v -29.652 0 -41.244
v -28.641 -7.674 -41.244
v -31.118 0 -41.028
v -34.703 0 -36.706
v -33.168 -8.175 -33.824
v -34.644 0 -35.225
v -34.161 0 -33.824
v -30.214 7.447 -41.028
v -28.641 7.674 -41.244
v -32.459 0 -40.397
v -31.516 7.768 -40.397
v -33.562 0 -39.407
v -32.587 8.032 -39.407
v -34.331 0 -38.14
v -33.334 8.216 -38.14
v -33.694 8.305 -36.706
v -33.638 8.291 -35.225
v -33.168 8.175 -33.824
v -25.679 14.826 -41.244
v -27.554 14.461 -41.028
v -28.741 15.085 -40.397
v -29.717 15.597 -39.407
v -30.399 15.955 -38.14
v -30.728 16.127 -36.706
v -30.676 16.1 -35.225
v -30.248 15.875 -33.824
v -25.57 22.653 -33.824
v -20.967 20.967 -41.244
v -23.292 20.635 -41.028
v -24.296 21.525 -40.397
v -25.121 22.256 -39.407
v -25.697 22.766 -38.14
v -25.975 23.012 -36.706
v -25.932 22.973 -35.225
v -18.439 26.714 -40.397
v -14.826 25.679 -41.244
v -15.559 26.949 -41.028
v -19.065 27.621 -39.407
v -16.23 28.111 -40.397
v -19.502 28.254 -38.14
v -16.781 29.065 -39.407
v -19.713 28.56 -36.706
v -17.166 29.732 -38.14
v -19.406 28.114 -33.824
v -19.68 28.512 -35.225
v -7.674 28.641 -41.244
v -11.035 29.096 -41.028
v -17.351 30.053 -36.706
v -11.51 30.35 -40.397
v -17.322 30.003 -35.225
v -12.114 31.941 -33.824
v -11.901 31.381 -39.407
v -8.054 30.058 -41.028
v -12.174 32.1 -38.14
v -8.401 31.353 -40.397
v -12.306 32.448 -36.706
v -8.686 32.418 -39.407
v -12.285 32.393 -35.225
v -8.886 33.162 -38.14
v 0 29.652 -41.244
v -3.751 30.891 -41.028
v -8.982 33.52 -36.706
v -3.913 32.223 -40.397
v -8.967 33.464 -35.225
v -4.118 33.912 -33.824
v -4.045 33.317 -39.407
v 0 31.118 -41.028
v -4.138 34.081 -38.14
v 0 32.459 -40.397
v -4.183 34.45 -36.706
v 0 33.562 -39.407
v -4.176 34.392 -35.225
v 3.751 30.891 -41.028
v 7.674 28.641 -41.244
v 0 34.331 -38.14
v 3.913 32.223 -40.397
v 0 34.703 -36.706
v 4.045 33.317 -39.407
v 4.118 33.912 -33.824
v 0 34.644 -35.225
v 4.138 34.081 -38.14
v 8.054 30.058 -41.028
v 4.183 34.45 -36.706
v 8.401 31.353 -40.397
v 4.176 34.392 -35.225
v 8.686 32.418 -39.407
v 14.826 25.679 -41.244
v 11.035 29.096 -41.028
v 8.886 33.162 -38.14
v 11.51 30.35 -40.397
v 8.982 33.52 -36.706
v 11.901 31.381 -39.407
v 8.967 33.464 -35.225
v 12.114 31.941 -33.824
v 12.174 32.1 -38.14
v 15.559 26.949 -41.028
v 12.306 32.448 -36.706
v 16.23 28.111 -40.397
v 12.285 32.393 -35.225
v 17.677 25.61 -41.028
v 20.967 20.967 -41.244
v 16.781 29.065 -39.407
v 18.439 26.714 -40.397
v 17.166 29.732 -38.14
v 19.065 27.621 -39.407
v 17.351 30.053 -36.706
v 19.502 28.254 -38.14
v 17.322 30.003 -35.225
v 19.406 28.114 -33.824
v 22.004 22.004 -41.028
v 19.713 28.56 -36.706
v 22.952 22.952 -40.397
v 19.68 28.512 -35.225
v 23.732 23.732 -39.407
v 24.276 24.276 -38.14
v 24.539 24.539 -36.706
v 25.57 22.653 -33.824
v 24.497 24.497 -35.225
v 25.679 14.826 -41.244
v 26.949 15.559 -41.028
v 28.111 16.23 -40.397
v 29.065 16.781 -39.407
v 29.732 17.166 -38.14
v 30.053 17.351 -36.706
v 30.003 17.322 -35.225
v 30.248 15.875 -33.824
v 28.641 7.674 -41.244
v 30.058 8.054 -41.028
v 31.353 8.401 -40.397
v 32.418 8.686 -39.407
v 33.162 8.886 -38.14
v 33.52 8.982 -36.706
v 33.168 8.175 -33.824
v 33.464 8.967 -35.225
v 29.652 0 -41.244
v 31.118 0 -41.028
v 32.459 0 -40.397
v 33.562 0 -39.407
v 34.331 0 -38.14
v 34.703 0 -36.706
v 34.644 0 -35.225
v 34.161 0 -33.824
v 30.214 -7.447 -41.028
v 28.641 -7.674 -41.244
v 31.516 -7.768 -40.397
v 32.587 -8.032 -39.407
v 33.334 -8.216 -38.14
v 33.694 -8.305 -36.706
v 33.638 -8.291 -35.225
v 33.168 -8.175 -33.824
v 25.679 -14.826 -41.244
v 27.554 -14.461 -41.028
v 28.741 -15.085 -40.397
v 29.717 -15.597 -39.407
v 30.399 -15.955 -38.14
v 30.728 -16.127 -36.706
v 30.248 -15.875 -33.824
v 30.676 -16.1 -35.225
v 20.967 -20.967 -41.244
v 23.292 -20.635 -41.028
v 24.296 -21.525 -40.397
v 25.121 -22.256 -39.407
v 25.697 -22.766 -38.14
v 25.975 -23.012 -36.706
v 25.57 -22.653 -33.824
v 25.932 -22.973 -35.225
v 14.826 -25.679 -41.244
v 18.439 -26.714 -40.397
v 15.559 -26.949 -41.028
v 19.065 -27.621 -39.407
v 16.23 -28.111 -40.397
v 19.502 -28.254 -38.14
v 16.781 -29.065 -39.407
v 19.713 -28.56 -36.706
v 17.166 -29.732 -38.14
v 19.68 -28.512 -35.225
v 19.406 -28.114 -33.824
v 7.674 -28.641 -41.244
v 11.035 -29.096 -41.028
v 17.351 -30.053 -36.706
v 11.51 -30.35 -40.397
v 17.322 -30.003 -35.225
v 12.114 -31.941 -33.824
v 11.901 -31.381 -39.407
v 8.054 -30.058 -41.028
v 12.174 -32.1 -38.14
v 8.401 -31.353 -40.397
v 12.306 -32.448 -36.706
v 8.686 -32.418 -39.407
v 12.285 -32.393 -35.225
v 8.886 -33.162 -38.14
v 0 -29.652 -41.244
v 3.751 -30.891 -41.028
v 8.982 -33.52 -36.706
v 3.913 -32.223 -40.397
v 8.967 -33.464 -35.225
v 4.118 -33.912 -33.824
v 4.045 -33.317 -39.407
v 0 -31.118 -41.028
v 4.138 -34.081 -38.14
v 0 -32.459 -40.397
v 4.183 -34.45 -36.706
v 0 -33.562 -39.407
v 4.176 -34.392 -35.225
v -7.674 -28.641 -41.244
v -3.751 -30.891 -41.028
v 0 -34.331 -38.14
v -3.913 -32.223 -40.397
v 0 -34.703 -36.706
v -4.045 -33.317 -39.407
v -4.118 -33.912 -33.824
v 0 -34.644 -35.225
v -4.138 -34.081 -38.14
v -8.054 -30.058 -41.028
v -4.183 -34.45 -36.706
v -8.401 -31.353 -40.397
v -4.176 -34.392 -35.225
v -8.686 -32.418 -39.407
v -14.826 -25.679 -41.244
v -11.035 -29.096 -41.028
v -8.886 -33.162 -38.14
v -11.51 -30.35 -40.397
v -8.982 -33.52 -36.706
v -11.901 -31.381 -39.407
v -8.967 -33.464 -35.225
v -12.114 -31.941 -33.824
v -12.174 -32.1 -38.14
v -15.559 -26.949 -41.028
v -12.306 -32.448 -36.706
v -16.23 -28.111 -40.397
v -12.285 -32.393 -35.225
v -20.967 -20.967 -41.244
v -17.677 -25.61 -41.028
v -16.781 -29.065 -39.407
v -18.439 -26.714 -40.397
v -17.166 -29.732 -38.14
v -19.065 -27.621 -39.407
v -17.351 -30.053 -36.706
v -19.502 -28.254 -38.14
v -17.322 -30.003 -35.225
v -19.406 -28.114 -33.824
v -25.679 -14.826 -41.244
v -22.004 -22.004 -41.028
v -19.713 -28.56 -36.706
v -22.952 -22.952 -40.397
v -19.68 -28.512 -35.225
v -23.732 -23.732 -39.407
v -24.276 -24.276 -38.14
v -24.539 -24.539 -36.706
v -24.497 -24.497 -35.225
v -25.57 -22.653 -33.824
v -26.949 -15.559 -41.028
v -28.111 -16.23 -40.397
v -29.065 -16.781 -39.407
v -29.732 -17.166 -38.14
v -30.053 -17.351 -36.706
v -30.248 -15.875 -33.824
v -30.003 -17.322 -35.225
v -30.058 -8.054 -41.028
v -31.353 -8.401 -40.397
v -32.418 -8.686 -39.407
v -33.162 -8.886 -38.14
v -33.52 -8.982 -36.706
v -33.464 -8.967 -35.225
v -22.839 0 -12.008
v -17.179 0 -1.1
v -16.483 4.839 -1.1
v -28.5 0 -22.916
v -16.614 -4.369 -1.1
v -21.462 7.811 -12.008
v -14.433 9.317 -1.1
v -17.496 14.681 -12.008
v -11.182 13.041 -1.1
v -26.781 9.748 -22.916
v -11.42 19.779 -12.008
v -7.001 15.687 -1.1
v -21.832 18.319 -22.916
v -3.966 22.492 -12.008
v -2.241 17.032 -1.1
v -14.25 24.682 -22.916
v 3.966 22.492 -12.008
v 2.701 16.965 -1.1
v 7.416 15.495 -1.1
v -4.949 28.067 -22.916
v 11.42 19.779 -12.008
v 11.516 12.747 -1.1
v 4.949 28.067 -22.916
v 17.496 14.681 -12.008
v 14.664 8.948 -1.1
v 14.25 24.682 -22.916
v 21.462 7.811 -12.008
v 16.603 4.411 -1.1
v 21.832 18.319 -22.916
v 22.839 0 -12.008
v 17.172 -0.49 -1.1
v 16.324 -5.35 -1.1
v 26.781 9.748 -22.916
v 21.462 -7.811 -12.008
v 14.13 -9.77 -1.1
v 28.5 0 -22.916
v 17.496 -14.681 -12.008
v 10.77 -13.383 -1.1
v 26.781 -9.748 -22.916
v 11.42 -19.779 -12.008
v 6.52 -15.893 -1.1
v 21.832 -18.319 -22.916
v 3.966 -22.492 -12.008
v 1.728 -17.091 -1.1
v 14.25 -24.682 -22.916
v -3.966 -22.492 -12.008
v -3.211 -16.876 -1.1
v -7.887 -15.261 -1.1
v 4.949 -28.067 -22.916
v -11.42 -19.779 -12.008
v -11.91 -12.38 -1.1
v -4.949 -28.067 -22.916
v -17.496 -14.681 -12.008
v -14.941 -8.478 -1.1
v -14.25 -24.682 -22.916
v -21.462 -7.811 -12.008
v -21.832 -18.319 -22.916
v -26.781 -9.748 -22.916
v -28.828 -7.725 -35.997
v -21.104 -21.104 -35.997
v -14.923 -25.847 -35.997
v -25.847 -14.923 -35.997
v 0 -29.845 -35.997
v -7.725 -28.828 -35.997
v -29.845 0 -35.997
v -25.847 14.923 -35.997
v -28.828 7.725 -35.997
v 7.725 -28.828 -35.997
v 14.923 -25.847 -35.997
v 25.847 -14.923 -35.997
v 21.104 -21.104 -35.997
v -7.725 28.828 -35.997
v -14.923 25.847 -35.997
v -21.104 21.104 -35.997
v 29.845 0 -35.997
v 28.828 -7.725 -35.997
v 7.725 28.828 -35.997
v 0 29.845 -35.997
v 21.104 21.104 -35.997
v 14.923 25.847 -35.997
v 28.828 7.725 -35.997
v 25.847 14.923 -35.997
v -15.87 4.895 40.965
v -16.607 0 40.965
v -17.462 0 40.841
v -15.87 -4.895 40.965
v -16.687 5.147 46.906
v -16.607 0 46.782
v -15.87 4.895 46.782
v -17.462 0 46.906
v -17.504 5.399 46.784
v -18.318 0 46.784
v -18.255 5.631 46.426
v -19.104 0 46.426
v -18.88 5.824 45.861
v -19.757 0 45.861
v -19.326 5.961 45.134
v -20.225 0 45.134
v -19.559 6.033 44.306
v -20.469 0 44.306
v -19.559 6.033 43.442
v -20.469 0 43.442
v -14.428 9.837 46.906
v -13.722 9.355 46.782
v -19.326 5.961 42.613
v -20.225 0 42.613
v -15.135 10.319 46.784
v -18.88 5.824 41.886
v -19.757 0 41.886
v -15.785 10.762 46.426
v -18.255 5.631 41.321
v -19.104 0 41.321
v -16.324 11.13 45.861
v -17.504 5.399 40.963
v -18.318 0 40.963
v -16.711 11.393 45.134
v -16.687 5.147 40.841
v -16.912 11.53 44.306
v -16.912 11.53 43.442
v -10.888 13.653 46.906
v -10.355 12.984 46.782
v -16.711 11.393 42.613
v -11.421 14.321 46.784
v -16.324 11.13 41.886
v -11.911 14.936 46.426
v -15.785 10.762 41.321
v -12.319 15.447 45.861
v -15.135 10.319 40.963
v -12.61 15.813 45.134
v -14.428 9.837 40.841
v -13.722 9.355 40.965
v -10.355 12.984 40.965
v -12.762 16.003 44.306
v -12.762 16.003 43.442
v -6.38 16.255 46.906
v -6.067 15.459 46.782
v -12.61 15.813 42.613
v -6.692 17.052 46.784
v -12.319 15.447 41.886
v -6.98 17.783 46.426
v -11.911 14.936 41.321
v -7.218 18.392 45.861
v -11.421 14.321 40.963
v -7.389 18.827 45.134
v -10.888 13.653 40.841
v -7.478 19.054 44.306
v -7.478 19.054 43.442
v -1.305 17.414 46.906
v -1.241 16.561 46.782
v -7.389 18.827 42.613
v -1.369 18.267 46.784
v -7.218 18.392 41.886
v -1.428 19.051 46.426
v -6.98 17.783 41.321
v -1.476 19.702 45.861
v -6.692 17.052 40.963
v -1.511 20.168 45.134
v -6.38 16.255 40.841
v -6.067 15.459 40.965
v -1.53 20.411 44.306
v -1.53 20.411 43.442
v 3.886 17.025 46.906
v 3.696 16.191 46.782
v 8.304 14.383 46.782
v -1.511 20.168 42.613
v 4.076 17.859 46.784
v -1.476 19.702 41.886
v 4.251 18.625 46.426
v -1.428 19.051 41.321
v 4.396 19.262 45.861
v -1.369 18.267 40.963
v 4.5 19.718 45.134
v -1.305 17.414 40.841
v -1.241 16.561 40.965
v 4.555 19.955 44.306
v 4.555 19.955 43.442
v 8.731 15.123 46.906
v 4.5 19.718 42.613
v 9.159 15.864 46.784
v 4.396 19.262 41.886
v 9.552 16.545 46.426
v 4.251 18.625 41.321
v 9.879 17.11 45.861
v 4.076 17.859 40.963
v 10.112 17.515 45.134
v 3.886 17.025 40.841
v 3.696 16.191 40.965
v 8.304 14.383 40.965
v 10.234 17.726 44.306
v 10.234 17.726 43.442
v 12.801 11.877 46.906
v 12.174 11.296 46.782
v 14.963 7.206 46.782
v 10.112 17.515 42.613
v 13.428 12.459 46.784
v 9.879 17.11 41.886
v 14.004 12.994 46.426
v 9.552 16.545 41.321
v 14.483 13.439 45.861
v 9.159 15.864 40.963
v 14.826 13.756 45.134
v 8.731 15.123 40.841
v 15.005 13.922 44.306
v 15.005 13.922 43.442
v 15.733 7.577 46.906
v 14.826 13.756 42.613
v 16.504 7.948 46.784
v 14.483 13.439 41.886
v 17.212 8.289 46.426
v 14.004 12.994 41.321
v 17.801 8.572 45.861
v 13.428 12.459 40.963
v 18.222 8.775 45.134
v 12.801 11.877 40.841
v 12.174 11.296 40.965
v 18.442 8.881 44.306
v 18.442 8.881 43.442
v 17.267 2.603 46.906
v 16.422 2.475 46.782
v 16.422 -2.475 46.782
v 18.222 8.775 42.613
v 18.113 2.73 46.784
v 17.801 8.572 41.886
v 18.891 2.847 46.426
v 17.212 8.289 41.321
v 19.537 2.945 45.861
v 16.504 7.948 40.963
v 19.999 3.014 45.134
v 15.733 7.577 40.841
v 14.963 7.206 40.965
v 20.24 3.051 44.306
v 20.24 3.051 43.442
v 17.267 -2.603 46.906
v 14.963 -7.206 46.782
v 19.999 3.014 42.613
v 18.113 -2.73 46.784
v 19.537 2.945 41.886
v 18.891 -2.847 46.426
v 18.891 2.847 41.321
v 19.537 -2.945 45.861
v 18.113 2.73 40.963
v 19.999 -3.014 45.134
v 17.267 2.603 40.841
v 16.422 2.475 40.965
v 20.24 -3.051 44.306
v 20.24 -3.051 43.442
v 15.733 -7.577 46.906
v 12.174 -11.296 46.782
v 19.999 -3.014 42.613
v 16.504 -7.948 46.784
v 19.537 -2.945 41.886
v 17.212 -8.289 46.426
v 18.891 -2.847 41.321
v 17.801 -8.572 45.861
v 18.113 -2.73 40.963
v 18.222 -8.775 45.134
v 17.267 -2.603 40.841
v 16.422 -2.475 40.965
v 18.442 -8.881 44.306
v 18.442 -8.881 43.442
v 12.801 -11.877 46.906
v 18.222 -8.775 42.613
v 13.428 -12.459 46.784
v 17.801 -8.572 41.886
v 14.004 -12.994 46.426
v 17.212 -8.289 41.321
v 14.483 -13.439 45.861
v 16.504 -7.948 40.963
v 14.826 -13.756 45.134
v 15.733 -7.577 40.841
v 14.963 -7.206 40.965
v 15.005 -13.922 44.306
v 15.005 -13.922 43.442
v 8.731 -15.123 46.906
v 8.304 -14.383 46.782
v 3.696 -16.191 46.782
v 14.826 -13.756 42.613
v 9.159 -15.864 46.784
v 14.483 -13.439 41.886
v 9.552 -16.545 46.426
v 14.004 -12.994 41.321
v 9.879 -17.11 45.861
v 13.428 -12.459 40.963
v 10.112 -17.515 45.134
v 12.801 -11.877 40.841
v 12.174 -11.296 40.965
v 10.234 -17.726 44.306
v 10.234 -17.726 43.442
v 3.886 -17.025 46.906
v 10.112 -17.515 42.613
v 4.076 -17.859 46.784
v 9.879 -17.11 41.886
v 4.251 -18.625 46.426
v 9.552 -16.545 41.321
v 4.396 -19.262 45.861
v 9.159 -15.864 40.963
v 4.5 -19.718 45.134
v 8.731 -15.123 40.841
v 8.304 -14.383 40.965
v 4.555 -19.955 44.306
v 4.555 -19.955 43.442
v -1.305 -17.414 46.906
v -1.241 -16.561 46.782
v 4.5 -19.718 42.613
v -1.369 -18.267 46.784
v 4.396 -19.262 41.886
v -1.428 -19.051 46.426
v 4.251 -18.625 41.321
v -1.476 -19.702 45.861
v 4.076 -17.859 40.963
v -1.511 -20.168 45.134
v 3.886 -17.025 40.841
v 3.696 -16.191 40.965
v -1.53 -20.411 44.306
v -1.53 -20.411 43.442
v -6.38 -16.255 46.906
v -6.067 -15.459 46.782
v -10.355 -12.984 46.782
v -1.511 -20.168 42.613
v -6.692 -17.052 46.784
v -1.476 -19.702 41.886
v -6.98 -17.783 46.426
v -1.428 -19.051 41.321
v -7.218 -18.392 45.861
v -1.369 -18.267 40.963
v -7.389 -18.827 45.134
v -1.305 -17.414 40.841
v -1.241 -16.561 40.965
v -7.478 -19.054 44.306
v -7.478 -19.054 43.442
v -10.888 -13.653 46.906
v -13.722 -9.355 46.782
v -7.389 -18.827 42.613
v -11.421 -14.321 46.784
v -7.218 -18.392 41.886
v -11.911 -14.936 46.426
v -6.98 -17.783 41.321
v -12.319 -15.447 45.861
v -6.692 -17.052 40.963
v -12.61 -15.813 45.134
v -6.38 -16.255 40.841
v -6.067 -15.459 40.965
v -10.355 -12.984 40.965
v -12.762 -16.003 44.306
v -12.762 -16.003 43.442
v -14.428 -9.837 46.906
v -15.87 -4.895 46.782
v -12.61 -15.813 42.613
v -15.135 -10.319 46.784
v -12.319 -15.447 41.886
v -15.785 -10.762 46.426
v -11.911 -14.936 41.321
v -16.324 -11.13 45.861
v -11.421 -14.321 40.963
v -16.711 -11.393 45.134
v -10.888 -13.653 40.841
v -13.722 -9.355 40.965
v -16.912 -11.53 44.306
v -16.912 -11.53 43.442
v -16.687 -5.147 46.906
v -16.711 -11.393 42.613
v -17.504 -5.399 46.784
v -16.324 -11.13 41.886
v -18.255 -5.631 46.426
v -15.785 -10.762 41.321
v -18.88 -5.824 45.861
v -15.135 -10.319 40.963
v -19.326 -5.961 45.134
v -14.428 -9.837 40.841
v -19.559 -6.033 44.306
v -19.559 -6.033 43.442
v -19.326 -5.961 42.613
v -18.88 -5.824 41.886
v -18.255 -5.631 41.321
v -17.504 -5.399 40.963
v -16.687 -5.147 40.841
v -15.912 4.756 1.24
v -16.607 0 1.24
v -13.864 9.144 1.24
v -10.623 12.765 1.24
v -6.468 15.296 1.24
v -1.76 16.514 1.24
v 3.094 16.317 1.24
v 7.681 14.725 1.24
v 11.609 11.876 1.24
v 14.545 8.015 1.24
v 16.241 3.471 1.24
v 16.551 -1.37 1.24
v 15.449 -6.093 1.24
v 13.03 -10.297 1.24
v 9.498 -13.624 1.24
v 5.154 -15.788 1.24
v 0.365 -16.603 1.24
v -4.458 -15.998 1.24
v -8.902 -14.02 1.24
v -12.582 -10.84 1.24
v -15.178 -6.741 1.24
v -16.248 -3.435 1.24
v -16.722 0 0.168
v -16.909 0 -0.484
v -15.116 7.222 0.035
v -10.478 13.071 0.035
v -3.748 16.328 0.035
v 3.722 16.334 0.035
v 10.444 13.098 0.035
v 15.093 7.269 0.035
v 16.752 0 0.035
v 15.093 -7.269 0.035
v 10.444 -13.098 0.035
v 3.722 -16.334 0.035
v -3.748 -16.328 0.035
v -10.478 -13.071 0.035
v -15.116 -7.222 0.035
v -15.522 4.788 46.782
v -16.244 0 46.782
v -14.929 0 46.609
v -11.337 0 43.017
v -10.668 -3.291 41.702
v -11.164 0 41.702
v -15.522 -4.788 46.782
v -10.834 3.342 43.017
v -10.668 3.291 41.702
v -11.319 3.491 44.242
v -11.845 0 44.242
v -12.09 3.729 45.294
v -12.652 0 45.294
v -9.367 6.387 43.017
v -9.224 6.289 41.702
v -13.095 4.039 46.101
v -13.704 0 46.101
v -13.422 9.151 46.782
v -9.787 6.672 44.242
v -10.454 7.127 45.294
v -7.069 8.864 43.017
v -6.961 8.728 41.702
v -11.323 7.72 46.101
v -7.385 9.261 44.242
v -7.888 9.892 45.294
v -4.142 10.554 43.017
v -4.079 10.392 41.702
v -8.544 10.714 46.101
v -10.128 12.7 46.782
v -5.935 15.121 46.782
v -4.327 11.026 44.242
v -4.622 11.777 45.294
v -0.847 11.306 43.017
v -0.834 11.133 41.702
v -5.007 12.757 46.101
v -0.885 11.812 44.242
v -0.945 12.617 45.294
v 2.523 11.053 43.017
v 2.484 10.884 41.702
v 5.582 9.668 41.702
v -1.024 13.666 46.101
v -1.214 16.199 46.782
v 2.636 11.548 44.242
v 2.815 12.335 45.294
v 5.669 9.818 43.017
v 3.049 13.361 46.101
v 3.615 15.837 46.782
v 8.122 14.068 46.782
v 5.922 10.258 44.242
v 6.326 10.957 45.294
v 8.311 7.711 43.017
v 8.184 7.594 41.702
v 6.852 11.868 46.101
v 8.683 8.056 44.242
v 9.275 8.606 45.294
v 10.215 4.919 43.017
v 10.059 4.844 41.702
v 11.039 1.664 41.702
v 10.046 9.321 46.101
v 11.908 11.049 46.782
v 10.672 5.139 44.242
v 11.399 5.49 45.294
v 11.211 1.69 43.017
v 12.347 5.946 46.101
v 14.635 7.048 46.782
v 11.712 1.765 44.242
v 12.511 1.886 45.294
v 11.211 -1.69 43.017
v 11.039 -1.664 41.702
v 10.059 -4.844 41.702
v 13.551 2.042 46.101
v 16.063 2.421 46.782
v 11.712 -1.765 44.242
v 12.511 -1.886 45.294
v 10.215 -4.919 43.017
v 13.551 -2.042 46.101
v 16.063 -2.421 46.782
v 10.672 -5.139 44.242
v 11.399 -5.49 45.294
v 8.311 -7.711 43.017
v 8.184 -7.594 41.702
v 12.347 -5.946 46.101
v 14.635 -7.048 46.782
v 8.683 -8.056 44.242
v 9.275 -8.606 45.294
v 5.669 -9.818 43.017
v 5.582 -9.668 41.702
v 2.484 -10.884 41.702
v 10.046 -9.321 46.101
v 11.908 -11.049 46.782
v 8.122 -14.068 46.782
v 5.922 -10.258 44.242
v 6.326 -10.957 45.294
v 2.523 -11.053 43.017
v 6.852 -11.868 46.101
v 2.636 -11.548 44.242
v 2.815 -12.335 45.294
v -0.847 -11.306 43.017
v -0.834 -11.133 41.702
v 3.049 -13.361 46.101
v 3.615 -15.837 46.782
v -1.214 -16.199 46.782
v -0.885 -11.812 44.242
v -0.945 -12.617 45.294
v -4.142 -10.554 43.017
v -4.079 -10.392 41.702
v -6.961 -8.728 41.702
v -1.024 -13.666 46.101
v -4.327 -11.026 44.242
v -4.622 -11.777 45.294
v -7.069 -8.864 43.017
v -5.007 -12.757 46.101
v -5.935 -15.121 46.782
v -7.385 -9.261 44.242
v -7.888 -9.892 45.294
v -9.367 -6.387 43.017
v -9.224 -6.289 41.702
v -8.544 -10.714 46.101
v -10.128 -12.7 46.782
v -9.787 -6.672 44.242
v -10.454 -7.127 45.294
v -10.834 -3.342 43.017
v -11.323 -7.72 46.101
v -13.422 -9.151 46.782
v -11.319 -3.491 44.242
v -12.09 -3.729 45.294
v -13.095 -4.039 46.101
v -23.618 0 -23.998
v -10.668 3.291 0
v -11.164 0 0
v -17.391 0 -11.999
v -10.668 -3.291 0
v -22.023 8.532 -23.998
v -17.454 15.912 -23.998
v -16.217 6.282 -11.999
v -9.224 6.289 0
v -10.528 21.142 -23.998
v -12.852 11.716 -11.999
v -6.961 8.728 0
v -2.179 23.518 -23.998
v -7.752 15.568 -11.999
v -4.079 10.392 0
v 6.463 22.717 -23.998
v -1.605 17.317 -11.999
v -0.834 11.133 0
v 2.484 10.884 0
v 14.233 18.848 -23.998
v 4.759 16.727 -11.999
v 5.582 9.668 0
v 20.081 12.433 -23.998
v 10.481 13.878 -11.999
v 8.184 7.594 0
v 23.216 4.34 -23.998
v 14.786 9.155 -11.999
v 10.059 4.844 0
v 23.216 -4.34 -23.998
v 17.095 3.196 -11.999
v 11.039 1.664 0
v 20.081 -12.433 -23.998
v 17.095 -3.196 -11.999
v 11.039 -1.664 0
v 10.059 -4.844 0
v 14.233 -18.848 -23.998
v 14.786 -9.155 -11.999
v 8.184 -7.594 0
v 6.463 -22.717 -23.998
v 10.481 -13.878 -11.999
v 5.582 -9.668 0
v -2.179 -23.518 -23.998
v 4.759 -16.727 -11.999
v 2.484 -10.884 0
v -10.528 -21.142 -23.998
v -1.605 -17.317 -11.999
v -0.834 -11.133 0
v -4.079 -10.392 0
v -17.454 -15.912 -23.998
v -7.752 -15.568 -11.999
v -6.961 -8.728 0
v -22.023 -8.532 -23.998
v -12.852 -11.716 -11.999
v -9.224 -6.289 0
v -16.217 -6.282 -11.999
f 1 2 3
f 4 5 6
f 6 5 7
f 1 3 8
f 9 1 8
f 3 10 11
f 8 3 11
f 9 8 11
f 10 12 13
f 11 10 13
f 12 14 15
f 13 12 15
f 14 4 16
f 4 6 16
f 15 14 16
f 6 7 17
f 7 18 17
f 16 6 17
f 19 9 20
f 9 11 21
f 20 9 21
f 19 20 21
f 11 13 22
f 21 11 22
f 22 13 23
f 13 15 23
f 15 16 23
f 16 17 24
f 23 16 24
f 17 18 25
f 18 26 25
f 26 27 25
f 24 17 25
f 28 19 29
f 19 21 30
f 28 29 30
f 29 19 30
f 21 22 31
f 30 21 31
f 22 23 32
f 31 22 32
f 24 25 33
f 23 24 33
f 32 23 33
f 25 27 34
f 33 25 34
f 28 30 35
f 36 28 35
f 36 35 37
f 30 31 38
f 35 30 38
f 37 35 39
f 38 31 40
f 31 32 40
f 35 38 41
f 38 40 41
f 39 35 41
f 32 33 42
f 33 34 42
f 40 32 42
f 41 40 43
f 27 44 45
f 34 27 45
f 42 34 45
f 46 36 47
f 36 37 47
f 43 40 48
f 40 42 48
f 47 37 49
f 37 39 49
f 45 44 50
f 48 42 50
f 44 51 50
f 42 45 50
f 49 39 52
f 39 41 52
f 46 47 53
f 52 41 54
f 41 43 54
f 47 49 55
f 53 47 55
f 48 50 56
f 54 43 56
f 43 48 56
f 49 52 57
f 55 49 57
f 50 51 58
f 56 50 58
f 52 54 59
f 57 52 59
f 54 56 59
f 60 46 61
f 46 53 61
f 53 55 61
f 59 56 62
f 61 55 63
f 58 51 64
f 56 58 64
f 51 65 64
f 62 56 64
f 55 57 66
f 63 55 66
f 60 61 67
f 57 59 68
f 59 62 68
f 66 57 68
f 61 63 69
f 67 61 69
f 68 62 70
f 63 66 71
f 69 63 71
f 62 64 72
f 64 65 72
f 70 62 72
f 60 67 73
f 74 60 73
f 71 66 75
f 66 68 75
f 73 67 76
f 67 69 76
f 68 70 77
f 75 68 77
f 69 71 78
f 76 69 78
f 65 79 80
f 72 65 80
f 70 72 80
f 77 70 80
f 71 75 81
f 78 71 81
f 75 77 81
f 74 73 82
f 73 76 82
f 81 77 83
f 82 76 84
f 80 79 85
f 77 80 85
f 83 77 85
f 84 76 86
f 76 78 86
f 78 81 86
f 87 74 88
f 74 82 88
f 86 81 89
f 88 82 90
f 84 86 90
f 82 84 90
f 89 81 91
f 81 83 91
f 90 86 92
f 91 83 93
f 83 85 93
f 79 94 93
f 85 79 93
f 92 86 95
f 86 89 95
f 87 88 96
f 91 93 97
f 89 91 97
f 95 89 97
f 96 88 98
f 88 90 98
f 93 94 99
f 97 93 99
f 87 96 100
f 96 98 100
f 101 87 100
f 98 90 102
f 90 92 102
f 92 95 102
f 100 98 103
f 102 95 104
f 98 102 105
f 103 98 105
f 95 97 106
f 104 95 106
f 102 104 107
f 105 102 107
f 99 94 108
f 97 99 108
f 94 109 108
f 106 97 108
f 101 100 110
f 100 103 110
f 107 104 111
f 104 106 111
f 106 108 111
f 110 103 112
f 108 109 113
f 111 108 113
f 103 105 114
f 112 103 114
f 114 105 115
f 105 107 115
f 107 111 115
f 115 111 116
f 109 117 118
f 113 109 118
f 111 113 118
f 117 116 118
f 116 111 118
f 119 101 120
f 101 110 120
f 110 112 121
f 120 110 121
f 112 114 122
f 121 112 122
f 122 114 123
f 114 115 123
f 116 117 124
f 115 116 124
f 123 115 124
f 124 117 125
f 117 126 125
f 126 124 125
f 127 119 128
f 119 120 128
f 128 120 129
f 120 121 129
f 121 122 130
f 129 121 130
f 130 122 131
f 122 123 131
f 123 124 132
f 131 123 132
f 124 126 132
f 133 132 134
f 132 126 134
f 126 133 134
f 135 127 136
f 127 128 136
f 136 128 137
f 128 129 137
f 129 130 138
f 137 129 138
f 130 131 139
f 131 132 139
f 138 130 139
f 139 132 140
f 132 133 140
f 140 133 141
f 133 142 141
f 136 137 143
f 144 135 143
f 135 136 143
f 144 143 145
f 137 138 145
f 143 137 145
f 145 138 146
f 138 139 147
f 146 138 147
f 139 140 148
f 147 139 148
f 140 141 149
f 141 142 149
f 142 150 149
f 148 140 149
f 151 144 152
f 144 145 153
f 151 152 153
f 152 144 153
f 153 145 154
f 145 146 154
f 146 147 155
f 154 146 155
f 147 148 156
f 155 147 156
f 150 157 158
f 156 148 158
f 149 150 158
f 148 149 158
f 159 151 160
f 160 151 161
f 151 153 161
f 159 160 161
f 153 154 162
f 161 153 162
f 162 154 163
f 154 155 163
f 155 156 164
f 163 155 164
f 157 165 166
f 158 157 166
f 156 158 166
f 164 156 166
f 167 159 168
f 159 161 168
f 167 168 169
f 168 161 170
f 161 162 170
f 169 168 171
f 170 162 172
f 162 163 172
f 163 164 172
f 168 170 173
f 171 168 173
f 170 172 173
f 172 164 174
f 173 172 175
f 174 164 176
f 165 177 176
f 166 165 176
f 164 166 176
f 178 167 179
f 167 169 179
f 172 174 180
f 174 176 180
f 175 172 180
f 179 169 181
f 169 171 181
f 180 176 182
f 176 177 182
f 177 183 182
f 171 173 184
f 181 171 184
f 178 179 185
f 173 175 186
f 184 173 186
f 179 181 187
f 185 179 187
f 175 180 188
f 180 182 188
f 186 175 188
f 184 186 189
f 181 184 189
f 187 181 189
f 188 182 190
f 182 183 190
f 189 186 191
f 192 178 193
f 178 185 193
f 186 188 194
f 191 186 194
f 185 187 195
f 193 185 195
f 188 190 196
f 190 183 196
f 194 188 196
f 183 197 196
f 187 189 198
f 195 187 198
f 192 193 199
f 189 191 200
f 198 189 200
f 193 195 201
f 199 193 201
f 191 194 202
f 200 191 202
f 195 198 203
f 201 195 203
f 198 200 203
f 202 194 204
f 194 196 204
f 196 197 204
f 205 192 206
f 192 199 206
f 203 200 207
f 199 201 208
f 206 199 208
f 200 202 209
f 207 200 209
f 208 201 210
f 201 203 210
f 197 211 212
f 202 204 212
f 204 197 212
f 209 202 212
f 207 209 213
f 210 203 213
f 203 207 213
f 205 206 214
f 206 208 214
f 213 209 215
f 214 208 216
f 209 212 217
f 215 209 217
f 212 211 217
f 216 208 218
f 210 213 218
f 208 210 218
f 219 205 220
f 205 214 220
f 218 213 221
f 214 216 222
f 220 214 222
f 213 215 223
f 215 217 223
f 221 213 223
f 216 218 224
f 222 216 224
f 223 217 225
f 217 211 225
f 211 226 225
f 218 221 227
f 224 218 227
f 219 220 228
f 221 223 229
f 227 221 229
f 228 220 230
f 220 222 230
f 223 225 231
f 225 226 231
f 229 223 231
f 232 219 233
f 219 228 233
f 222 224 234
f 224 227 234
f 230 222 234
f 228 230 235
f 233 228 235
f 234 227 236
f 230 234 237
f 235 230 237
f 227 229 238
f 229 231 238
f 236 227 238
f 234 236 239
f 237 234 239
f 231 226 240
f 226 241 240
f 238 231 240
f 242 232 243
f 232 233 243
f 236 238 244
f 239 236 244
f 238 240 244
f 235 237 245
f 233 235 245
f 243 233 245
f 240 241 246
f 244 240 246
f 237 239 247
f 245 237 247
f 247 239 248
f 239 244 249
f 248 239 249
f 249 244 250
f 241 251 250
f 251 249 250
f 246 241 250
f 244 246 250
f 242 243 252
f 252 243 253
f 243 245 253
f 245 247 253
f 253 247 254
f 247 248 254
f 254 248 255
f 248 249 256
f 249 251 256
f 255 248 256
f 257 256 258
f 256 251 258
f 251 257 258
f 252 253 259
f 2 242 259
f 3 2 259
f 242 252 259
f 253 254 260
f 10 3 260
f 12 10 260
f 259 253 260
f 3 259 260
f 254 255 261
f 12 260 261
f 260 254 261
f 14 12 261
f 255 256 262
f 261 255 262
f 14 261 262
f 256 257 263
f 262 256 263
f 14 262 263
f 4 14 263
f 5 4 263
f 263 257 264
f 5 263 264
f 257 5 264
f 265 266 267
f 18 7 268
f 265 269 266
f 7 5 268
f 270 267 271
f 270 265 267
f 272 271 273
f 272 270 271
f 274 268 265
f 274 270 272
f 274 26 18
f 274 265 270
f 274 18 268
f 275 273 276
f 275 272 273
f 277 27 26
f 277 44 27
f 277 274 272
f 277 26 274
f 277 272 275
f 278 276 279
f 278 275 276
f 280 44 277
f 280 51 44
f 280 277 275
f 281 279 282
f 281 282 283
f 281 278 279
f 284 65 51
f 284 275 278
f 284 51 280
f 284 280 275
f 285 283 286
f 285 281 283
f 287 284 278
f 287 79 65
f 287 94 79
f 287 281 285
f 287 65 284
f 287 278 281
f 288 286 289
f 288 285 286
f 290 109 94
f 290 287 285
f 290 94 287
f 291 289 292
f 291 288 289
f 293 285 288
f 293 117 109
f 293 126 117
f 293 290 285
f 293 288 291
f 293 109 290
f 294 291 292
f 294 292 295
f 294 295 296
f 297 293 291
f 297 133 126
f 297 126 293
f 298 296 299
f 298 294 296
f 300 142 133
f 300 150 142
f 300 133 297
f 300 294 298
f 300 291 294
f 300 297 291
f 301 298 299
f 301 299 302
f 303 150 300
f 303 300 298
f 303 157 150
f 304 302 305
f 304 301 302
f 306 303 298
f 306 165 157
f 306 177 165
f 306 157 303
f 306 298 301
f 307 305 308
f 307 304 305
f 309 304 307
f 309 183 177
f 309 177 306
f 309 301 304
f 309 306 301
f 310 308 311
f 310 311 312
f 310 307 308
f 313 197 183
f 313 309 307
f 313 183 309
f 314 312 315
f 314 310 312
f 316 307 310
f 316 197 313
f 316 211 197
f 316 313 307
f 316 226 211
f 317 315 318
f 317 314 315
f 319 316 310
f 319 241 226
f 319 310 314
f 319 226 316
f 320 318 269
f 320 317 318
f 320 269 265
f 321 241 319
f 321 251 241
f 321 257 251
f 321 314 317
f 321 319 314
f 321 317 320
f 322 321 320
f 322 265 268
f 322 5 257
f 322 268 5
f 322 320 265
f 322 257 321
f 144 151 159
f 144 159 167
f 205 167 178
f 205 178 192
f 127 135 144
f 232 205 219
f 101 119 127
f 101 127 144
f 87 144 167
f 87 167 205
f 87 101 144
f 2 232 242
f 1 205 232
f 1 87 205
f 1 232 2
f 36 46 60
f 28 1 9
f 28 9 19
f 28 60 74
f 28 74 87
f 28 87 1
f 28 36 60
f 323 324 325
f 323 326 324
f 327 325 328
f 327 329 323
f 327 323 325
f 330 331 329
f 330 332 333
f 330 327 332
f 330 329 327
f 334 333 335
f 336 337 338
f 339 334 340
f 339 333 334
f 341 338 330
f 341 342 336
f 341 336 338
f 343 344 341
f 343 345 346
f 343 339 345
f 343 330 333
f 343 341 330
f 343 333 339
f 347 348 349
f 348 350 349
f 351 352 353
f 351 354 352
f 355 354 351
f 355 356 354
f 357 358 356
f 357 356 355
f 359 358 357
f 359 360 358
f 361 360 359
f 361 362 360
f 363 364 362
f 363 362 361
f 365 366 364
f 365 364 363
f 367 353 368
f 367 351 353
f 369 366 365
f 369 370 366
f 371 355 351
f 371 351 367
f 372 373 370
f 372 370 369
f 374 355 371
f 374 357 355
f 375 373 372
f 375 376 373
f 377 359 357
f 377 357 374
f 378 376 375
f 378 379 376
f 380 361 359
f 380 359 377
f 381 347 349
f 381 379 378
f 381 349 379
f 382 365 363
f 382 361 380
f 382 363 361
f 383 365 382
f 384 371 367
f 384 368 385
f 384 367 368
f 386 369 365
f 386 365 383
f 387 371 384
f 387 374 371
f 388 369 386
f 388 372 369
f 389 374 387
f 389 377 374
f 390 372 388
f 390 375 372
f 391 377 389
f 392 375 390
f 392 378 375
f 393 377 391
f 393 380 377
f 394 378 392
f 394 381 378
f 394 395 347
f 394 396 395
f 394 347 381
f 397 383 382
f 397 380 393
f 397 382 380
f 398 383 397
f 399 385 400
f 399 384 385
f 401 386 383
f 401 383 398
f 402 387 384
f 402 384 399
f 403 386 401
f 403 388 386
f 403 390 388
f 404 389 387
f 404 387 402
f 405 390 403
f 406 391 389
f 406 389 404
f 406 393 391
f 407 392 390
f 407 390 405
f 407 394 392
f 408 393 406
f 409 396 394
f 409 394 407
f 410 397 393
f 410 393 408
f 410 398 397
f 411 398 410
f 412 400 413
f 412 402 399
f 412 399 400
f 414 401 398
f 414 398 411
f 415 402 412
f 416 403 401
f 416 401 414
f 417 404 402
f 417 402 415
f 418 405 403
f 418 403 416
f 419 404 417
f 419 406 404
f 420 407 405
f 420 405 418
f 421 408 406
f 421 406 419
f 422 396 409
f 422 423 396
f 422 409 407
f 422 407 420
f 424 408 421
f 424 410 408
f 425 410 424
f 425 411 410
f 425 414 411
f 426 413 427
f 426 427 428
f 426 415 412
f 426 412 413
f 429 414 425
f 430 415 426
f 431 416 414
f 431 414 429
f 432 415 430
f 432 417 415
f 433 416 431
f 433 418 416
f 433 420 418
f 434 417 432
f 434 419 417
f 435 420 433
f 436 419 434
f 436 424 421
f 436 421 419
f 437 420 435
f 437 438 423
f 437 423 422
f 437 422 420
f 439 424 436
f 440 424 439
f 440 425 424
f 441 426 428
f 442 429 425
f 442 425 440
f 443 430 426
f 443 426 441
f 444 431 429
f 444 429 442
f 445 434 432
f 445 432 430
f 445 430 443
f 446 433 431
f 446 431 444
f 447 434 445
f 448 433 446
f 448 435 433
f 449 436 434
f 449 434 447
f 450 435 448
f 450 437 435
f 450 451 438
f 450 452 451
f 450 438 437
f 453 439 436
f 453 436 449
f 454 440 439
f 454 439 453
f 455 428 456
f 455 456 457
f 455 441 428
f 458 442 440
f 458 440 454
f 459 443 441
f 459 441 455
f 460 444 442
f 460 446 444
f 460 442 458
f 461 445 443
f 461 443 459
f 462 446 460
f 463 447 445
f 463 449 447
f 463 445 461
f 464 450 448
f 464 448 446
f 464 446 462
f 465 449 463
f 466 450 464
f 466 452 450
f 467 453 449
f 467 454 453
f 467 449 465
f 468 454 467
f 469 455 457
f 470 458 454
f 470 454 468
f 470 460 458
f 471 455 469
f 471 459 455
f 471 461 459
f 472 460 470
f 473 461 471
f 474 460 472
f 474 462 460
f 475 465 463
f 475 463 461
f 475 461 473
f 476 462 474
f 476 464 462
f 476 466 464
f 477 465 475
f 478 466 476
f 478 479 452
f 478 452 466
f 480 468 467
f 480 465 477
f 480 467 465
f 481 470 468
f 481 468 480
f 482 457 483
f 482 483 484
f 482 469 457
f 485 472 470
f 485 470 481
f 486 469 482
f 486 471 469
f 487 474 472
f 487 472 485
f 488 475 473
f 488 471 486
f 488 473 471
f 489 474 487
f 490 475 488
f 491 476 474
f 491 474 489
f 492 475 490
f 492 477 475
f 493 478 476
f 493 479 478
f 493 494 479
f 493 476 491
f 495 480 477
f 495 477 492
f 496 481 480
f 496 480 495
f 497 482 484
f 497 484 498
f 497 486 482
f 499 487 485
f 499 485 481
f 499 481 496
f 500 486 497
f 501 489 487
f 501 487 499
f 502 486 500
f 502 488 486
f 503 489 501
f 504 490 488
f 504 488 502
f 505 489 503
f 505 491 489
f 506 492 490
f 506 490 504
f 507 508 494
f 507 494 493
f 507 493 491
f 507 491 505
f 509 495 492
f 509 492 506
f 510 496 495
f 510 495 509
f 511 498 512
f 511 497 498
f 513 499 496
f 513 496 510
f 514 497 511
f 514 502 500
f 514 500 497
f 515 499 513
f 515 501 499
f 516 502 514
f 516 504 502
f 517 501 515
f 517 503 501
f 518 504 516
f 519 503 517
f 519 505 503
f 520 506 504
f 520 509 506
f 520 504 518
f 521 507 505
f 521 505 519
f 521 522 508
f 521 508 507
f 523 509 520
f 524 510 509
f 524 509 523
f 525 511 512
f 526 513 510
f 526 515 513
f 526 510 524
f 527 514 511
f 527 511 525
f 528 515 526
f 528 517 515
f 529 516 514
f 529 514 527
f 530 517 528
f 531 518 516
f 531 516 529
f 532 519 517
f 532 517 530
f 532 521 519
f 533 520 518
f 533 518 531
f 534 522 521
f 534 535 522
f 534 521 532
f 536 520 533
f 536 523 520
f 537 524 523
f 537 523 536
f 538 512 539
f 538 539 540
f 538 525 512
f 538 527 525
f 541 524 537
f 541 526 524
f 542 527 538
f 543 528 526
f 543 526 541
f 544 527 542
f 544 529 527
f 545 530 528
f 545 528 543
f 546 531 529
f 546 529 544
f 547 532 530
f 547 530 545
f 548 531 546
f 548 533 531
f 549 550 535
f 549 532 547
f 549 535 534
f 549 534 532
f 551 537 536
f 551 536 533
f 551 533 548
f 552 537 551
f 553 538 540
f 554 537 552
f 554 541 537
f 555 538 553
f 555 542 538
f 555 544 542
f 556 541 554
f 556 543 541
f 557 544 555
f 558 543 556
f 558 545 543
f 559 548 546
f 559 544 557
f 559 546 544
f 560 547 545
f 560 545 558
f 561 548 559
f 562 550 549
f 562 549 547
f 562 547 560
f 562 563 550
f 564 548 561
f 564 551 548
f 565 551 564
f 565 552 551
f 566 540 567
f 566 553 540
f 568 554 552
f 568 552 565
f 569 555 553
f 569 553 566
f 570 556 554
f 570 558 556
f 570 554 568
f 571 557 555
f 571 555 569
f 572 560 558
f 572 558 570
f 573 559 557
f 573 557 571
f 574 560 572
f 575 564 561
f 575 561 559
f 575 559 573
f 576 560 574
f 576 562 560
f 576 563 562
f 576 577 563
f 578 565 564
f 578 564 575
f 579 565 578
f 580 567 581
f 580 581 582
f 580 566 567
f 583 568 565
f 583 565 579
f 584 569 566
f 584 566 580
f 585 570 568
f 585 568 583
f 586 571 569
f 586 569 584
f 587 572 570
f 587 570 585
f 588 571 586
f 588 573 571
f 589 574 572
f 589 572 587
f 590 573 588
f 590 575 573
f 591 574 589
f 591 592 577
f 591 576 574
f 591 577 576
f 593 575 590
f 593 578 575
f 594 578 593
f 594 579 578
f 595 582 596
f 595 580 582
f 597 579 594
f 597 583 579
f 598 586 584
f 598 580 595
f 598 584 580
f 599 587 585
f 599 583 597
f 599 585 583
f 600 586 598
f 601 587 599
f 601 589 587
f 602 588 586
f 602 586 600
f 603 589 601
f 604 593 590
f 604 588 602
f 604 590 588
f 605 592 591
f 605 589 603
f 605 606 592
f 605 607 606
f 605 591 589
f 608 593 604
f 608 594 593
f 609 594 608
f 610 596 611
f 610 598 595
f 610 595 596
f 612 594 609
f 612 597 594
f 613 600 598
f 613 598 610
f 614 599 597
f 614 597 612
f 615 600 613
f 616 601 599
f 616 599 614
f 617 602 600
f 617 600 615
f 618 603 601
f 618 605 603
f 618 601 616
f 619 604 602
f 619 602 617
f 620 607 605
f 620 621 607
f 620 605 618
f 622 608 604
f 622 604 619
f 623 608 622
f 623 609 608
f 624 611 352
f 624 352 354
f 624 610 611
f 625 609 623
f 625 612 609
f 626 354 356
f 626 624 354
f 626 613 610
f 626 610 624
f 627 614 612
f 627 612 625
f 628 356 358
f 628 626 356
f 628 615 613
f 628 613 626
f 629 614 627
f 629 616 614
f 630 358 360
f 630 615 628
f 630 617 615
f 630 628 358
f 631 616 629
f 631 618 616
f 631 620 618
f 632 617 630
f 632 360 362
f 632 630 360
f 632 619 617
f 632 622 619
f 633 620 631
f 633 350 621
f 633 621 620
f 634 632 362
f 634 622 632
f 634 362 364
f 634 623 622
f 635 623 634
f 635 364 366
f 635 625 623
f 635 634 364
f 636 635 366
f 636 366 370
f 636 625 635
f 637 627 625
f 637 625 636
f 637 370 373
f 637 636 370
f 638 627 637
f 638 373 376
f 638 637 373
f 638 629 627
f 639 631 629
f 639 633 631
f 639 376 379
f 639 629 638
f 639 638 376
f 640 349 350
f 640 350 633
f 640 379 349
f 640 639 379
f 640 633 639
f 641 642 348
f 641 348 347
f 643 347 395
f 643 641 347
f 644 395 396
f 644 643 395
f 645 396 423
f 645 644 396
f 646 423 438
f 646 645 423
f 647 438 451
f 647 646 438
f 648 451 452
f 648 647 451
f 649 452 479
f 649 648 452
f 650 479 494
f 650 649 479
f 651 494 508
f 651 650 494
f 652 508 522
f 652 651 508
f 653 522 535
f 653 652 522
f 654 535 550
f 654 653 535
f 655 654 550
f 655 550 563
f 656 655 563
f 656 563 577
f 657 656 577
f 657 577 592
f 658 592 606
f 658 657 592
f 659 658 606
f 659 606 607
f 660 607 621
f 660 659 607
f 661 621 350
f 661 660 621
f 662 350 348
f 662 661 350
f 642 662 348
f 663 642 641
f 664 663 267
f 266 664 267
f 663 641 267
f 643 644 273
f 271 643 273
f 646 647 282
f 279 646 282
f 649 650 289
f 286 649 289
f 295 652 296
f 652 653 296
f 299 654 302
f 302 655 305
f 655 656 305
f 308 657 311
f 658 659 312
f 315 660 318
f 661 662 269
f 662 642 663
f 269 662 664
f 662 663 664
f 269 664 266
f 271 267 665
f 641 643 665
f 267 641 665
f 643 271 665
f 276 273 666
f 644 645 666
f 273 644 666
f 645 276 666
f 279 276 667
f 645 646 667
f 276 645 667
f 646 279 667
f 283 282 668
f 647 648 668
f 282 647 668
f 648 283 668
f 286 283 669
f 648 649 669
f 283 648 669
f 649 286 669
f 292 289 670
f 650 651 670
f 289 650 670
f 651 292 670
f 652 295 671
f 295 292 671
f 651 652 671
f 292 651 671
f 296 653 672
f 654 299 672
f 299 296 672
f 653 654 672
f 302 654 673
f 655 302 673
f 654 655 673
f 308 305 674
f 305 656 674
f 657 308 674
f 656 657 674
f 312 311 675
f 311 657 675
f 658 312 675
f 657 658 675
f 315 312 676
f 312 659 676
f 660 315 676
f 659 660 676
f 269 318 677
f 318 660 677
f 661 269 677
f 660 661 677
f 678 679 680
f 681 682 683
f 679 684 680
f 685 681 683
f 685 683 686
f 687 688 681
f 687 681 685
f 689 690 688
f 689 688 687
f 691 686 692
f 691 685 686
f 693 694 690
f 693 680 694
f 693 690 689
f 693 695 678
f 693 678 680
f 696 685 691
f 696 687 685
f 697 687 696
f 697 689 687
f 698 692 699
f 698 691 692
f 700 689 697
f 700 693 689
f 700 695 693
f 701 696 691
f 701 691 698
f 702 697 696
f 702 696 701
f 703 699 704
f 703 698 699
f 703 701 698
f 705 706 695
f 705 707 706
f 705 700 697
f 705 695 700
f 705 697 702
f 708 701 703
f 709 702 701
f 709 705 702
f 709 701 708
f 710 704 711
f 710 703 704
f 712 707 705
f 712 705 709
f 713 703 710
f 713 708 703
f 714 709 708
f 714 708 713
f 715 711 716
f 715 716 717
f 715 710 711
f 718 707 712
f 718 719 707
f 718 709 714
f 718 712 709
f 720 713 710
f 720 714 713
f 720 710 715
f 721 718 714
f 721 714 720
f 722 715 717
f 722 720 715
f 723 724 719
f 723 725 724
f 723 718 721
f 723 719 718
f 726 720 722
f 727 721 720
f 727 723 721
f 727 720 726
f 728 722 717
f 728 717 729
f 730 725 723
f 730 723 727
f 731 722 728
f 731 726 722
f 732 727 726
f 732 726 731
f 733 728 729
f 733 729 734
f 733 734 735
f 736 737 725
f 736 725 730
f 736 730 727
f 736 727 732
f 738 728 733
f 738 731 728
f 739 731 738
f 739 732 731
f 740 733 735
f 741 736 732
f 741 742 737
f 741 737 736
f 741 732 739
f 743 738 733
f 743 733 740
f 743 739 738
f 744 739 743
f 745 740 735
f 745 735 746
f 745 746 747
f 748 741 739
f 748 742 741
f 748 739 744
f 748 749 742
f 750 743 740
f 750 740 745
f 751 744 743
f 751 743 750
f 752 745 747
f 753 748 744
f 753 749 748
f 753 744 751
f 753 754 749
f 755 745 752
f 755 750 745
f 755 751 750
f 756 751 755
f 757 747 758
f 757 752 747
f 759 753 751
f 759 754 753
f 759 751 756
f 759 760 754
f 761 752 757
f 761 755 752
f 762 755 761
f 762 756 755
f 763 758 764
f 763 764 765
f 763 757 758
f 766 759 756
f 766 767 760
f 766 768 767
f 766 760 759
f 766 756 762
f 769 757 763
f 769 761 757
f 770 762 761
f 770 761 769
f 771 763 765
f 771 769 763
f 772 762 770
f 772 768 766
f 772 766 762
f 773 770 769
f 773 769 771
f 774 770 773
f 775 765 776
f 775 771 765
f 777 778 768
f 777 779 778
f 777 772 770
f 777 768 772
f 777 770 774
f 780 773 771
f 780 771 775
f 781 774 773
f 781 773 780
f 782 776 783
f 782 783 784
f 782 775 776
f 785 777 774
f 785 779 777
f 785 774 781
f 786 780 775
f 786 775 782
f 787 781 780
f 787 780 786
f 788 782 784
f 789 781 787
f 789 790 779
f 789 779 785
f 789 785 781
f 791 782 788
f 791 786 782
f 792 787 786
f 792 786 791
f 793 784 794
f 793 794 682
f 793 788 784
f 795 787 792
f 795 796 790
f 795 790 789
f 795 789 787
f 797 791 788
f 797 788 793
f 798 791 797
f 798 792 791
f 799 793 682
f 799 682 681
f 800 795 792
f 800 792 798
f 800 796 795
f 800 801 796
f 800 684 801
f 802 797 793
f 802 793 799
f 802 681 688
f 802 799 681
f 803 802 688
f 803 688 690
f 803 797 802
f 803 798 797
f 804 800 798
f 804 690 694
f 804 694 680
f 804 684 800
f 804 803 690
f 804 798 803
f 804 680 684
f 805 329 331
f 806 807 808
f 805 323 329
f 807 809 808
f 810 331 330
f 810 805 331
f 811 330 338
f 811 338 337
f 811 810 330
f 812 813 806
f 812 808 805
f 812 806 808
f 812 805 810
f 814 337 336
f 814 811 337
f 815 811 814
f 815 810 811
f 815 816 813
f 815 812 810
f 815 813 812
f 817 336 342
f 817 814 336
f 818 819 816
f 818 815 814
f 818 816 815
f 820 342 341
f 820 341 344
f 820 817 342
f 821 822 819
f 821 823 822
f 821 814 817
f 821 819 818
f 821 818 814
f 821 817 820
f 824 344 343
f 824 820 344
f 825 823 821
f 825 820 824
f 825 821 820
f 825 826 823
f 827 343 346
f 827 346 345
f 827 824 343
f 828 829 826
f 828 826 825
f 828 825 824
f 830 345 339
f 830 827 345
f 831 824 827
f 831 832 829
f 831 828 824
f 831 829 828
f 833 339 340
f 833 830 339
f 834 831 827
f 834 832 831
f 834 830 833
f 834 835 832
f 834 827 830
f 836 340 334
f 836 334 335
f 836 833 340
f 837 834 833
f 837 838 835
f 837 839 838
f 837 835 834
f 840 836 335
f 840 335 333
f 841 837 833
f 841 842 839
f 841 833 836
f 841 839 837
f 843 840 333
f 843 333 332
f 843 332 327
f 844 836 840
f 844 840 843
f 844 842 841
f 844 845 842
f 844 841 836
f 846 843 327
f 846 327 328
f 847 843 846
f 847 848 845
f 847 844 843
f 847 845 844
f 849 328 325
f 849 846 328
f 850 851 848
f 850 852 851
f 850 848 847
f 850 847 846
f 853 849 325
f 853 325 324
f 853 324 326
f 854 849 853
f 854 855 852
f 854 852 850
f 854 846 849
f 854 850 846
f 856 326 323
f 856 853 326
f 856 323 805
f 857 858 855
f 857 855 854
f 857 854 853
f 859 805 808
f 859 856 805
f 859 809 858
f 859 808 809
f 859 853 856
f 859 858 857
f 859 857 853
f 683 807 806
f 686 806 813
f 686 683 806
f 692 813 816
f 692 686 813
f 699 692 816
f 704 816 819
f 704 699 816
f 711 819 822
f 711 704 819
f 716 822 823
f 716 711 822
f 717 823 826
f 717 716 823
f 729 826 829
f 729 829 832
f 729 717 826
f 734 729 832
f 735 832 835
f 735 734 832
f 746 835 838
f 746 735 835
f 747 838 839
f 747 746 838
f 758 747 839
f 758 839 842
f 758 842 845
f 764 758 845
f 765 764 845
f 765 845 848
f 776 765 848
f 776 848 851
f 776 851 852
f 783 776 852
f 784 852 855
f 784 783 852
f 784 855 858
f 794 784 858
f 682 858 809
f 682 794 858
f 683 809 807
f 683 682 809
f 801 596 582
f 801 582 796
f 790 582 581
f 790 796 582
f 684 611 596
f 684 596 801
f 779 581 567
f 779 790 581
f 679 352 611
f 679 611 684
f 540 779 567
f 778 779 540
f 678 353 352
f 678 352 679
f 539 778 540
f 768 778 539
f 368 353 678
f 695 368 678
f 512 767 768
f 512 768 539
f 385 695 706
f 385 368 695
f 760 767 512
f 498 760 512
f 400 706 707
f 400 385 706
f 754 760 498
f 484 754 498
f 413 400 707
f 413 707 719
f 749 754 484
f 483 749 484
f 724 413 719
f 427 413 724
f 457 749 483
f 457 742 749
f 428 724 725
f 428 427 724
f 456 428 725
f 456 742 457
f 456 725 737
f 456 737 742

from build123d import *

# Parameters (mm, degrees)
F2_R = 5.08


with BuildPart() as f1:
    # F0 (on Front) → F1 (revolve)
    with BuildSketch(Plane.XZ):
        with BuildLine():
            Line((-38.011436, -41.243773), (0, -41.243773))
            Line((0, -41.243773), (0, -35.997218))
            Line((0, -35.997218), (-29.845339, -35.997218))
            Line((-29.845339, -35.997218), (-11.164162, 0))
            Line((-11.164162, 0), (-11.164162, 46.781804))
            Line((-11.164162, 46.781804), (-16.607499, 46.781804))
            ThreePointArc((-16.607499, 46.781804), (-20.499533, 43.873593), (-16.607499, 40.965382))
            Line((-16.607499, 40.965382), (-16.607499, 0))
            Line((-16.607499, 0), (-38.011436, -41.243773))
        make_face()
    revolve(axis=Axis((0, 0, -38.620495), (0, 0, -1)))

    # F2
    f2_edges = [f1.edges().sort_by_distance(p)[0] for p in [
        (16.607499, 0, 0),
        (38.011436, 0, -41.243773),
        (-27.309468, 0, -20.621886),
        (11.164162, 0, 46.781804),
    ]]
    fillet(f2_edges, radius=F2_R)


solid = f1.part
